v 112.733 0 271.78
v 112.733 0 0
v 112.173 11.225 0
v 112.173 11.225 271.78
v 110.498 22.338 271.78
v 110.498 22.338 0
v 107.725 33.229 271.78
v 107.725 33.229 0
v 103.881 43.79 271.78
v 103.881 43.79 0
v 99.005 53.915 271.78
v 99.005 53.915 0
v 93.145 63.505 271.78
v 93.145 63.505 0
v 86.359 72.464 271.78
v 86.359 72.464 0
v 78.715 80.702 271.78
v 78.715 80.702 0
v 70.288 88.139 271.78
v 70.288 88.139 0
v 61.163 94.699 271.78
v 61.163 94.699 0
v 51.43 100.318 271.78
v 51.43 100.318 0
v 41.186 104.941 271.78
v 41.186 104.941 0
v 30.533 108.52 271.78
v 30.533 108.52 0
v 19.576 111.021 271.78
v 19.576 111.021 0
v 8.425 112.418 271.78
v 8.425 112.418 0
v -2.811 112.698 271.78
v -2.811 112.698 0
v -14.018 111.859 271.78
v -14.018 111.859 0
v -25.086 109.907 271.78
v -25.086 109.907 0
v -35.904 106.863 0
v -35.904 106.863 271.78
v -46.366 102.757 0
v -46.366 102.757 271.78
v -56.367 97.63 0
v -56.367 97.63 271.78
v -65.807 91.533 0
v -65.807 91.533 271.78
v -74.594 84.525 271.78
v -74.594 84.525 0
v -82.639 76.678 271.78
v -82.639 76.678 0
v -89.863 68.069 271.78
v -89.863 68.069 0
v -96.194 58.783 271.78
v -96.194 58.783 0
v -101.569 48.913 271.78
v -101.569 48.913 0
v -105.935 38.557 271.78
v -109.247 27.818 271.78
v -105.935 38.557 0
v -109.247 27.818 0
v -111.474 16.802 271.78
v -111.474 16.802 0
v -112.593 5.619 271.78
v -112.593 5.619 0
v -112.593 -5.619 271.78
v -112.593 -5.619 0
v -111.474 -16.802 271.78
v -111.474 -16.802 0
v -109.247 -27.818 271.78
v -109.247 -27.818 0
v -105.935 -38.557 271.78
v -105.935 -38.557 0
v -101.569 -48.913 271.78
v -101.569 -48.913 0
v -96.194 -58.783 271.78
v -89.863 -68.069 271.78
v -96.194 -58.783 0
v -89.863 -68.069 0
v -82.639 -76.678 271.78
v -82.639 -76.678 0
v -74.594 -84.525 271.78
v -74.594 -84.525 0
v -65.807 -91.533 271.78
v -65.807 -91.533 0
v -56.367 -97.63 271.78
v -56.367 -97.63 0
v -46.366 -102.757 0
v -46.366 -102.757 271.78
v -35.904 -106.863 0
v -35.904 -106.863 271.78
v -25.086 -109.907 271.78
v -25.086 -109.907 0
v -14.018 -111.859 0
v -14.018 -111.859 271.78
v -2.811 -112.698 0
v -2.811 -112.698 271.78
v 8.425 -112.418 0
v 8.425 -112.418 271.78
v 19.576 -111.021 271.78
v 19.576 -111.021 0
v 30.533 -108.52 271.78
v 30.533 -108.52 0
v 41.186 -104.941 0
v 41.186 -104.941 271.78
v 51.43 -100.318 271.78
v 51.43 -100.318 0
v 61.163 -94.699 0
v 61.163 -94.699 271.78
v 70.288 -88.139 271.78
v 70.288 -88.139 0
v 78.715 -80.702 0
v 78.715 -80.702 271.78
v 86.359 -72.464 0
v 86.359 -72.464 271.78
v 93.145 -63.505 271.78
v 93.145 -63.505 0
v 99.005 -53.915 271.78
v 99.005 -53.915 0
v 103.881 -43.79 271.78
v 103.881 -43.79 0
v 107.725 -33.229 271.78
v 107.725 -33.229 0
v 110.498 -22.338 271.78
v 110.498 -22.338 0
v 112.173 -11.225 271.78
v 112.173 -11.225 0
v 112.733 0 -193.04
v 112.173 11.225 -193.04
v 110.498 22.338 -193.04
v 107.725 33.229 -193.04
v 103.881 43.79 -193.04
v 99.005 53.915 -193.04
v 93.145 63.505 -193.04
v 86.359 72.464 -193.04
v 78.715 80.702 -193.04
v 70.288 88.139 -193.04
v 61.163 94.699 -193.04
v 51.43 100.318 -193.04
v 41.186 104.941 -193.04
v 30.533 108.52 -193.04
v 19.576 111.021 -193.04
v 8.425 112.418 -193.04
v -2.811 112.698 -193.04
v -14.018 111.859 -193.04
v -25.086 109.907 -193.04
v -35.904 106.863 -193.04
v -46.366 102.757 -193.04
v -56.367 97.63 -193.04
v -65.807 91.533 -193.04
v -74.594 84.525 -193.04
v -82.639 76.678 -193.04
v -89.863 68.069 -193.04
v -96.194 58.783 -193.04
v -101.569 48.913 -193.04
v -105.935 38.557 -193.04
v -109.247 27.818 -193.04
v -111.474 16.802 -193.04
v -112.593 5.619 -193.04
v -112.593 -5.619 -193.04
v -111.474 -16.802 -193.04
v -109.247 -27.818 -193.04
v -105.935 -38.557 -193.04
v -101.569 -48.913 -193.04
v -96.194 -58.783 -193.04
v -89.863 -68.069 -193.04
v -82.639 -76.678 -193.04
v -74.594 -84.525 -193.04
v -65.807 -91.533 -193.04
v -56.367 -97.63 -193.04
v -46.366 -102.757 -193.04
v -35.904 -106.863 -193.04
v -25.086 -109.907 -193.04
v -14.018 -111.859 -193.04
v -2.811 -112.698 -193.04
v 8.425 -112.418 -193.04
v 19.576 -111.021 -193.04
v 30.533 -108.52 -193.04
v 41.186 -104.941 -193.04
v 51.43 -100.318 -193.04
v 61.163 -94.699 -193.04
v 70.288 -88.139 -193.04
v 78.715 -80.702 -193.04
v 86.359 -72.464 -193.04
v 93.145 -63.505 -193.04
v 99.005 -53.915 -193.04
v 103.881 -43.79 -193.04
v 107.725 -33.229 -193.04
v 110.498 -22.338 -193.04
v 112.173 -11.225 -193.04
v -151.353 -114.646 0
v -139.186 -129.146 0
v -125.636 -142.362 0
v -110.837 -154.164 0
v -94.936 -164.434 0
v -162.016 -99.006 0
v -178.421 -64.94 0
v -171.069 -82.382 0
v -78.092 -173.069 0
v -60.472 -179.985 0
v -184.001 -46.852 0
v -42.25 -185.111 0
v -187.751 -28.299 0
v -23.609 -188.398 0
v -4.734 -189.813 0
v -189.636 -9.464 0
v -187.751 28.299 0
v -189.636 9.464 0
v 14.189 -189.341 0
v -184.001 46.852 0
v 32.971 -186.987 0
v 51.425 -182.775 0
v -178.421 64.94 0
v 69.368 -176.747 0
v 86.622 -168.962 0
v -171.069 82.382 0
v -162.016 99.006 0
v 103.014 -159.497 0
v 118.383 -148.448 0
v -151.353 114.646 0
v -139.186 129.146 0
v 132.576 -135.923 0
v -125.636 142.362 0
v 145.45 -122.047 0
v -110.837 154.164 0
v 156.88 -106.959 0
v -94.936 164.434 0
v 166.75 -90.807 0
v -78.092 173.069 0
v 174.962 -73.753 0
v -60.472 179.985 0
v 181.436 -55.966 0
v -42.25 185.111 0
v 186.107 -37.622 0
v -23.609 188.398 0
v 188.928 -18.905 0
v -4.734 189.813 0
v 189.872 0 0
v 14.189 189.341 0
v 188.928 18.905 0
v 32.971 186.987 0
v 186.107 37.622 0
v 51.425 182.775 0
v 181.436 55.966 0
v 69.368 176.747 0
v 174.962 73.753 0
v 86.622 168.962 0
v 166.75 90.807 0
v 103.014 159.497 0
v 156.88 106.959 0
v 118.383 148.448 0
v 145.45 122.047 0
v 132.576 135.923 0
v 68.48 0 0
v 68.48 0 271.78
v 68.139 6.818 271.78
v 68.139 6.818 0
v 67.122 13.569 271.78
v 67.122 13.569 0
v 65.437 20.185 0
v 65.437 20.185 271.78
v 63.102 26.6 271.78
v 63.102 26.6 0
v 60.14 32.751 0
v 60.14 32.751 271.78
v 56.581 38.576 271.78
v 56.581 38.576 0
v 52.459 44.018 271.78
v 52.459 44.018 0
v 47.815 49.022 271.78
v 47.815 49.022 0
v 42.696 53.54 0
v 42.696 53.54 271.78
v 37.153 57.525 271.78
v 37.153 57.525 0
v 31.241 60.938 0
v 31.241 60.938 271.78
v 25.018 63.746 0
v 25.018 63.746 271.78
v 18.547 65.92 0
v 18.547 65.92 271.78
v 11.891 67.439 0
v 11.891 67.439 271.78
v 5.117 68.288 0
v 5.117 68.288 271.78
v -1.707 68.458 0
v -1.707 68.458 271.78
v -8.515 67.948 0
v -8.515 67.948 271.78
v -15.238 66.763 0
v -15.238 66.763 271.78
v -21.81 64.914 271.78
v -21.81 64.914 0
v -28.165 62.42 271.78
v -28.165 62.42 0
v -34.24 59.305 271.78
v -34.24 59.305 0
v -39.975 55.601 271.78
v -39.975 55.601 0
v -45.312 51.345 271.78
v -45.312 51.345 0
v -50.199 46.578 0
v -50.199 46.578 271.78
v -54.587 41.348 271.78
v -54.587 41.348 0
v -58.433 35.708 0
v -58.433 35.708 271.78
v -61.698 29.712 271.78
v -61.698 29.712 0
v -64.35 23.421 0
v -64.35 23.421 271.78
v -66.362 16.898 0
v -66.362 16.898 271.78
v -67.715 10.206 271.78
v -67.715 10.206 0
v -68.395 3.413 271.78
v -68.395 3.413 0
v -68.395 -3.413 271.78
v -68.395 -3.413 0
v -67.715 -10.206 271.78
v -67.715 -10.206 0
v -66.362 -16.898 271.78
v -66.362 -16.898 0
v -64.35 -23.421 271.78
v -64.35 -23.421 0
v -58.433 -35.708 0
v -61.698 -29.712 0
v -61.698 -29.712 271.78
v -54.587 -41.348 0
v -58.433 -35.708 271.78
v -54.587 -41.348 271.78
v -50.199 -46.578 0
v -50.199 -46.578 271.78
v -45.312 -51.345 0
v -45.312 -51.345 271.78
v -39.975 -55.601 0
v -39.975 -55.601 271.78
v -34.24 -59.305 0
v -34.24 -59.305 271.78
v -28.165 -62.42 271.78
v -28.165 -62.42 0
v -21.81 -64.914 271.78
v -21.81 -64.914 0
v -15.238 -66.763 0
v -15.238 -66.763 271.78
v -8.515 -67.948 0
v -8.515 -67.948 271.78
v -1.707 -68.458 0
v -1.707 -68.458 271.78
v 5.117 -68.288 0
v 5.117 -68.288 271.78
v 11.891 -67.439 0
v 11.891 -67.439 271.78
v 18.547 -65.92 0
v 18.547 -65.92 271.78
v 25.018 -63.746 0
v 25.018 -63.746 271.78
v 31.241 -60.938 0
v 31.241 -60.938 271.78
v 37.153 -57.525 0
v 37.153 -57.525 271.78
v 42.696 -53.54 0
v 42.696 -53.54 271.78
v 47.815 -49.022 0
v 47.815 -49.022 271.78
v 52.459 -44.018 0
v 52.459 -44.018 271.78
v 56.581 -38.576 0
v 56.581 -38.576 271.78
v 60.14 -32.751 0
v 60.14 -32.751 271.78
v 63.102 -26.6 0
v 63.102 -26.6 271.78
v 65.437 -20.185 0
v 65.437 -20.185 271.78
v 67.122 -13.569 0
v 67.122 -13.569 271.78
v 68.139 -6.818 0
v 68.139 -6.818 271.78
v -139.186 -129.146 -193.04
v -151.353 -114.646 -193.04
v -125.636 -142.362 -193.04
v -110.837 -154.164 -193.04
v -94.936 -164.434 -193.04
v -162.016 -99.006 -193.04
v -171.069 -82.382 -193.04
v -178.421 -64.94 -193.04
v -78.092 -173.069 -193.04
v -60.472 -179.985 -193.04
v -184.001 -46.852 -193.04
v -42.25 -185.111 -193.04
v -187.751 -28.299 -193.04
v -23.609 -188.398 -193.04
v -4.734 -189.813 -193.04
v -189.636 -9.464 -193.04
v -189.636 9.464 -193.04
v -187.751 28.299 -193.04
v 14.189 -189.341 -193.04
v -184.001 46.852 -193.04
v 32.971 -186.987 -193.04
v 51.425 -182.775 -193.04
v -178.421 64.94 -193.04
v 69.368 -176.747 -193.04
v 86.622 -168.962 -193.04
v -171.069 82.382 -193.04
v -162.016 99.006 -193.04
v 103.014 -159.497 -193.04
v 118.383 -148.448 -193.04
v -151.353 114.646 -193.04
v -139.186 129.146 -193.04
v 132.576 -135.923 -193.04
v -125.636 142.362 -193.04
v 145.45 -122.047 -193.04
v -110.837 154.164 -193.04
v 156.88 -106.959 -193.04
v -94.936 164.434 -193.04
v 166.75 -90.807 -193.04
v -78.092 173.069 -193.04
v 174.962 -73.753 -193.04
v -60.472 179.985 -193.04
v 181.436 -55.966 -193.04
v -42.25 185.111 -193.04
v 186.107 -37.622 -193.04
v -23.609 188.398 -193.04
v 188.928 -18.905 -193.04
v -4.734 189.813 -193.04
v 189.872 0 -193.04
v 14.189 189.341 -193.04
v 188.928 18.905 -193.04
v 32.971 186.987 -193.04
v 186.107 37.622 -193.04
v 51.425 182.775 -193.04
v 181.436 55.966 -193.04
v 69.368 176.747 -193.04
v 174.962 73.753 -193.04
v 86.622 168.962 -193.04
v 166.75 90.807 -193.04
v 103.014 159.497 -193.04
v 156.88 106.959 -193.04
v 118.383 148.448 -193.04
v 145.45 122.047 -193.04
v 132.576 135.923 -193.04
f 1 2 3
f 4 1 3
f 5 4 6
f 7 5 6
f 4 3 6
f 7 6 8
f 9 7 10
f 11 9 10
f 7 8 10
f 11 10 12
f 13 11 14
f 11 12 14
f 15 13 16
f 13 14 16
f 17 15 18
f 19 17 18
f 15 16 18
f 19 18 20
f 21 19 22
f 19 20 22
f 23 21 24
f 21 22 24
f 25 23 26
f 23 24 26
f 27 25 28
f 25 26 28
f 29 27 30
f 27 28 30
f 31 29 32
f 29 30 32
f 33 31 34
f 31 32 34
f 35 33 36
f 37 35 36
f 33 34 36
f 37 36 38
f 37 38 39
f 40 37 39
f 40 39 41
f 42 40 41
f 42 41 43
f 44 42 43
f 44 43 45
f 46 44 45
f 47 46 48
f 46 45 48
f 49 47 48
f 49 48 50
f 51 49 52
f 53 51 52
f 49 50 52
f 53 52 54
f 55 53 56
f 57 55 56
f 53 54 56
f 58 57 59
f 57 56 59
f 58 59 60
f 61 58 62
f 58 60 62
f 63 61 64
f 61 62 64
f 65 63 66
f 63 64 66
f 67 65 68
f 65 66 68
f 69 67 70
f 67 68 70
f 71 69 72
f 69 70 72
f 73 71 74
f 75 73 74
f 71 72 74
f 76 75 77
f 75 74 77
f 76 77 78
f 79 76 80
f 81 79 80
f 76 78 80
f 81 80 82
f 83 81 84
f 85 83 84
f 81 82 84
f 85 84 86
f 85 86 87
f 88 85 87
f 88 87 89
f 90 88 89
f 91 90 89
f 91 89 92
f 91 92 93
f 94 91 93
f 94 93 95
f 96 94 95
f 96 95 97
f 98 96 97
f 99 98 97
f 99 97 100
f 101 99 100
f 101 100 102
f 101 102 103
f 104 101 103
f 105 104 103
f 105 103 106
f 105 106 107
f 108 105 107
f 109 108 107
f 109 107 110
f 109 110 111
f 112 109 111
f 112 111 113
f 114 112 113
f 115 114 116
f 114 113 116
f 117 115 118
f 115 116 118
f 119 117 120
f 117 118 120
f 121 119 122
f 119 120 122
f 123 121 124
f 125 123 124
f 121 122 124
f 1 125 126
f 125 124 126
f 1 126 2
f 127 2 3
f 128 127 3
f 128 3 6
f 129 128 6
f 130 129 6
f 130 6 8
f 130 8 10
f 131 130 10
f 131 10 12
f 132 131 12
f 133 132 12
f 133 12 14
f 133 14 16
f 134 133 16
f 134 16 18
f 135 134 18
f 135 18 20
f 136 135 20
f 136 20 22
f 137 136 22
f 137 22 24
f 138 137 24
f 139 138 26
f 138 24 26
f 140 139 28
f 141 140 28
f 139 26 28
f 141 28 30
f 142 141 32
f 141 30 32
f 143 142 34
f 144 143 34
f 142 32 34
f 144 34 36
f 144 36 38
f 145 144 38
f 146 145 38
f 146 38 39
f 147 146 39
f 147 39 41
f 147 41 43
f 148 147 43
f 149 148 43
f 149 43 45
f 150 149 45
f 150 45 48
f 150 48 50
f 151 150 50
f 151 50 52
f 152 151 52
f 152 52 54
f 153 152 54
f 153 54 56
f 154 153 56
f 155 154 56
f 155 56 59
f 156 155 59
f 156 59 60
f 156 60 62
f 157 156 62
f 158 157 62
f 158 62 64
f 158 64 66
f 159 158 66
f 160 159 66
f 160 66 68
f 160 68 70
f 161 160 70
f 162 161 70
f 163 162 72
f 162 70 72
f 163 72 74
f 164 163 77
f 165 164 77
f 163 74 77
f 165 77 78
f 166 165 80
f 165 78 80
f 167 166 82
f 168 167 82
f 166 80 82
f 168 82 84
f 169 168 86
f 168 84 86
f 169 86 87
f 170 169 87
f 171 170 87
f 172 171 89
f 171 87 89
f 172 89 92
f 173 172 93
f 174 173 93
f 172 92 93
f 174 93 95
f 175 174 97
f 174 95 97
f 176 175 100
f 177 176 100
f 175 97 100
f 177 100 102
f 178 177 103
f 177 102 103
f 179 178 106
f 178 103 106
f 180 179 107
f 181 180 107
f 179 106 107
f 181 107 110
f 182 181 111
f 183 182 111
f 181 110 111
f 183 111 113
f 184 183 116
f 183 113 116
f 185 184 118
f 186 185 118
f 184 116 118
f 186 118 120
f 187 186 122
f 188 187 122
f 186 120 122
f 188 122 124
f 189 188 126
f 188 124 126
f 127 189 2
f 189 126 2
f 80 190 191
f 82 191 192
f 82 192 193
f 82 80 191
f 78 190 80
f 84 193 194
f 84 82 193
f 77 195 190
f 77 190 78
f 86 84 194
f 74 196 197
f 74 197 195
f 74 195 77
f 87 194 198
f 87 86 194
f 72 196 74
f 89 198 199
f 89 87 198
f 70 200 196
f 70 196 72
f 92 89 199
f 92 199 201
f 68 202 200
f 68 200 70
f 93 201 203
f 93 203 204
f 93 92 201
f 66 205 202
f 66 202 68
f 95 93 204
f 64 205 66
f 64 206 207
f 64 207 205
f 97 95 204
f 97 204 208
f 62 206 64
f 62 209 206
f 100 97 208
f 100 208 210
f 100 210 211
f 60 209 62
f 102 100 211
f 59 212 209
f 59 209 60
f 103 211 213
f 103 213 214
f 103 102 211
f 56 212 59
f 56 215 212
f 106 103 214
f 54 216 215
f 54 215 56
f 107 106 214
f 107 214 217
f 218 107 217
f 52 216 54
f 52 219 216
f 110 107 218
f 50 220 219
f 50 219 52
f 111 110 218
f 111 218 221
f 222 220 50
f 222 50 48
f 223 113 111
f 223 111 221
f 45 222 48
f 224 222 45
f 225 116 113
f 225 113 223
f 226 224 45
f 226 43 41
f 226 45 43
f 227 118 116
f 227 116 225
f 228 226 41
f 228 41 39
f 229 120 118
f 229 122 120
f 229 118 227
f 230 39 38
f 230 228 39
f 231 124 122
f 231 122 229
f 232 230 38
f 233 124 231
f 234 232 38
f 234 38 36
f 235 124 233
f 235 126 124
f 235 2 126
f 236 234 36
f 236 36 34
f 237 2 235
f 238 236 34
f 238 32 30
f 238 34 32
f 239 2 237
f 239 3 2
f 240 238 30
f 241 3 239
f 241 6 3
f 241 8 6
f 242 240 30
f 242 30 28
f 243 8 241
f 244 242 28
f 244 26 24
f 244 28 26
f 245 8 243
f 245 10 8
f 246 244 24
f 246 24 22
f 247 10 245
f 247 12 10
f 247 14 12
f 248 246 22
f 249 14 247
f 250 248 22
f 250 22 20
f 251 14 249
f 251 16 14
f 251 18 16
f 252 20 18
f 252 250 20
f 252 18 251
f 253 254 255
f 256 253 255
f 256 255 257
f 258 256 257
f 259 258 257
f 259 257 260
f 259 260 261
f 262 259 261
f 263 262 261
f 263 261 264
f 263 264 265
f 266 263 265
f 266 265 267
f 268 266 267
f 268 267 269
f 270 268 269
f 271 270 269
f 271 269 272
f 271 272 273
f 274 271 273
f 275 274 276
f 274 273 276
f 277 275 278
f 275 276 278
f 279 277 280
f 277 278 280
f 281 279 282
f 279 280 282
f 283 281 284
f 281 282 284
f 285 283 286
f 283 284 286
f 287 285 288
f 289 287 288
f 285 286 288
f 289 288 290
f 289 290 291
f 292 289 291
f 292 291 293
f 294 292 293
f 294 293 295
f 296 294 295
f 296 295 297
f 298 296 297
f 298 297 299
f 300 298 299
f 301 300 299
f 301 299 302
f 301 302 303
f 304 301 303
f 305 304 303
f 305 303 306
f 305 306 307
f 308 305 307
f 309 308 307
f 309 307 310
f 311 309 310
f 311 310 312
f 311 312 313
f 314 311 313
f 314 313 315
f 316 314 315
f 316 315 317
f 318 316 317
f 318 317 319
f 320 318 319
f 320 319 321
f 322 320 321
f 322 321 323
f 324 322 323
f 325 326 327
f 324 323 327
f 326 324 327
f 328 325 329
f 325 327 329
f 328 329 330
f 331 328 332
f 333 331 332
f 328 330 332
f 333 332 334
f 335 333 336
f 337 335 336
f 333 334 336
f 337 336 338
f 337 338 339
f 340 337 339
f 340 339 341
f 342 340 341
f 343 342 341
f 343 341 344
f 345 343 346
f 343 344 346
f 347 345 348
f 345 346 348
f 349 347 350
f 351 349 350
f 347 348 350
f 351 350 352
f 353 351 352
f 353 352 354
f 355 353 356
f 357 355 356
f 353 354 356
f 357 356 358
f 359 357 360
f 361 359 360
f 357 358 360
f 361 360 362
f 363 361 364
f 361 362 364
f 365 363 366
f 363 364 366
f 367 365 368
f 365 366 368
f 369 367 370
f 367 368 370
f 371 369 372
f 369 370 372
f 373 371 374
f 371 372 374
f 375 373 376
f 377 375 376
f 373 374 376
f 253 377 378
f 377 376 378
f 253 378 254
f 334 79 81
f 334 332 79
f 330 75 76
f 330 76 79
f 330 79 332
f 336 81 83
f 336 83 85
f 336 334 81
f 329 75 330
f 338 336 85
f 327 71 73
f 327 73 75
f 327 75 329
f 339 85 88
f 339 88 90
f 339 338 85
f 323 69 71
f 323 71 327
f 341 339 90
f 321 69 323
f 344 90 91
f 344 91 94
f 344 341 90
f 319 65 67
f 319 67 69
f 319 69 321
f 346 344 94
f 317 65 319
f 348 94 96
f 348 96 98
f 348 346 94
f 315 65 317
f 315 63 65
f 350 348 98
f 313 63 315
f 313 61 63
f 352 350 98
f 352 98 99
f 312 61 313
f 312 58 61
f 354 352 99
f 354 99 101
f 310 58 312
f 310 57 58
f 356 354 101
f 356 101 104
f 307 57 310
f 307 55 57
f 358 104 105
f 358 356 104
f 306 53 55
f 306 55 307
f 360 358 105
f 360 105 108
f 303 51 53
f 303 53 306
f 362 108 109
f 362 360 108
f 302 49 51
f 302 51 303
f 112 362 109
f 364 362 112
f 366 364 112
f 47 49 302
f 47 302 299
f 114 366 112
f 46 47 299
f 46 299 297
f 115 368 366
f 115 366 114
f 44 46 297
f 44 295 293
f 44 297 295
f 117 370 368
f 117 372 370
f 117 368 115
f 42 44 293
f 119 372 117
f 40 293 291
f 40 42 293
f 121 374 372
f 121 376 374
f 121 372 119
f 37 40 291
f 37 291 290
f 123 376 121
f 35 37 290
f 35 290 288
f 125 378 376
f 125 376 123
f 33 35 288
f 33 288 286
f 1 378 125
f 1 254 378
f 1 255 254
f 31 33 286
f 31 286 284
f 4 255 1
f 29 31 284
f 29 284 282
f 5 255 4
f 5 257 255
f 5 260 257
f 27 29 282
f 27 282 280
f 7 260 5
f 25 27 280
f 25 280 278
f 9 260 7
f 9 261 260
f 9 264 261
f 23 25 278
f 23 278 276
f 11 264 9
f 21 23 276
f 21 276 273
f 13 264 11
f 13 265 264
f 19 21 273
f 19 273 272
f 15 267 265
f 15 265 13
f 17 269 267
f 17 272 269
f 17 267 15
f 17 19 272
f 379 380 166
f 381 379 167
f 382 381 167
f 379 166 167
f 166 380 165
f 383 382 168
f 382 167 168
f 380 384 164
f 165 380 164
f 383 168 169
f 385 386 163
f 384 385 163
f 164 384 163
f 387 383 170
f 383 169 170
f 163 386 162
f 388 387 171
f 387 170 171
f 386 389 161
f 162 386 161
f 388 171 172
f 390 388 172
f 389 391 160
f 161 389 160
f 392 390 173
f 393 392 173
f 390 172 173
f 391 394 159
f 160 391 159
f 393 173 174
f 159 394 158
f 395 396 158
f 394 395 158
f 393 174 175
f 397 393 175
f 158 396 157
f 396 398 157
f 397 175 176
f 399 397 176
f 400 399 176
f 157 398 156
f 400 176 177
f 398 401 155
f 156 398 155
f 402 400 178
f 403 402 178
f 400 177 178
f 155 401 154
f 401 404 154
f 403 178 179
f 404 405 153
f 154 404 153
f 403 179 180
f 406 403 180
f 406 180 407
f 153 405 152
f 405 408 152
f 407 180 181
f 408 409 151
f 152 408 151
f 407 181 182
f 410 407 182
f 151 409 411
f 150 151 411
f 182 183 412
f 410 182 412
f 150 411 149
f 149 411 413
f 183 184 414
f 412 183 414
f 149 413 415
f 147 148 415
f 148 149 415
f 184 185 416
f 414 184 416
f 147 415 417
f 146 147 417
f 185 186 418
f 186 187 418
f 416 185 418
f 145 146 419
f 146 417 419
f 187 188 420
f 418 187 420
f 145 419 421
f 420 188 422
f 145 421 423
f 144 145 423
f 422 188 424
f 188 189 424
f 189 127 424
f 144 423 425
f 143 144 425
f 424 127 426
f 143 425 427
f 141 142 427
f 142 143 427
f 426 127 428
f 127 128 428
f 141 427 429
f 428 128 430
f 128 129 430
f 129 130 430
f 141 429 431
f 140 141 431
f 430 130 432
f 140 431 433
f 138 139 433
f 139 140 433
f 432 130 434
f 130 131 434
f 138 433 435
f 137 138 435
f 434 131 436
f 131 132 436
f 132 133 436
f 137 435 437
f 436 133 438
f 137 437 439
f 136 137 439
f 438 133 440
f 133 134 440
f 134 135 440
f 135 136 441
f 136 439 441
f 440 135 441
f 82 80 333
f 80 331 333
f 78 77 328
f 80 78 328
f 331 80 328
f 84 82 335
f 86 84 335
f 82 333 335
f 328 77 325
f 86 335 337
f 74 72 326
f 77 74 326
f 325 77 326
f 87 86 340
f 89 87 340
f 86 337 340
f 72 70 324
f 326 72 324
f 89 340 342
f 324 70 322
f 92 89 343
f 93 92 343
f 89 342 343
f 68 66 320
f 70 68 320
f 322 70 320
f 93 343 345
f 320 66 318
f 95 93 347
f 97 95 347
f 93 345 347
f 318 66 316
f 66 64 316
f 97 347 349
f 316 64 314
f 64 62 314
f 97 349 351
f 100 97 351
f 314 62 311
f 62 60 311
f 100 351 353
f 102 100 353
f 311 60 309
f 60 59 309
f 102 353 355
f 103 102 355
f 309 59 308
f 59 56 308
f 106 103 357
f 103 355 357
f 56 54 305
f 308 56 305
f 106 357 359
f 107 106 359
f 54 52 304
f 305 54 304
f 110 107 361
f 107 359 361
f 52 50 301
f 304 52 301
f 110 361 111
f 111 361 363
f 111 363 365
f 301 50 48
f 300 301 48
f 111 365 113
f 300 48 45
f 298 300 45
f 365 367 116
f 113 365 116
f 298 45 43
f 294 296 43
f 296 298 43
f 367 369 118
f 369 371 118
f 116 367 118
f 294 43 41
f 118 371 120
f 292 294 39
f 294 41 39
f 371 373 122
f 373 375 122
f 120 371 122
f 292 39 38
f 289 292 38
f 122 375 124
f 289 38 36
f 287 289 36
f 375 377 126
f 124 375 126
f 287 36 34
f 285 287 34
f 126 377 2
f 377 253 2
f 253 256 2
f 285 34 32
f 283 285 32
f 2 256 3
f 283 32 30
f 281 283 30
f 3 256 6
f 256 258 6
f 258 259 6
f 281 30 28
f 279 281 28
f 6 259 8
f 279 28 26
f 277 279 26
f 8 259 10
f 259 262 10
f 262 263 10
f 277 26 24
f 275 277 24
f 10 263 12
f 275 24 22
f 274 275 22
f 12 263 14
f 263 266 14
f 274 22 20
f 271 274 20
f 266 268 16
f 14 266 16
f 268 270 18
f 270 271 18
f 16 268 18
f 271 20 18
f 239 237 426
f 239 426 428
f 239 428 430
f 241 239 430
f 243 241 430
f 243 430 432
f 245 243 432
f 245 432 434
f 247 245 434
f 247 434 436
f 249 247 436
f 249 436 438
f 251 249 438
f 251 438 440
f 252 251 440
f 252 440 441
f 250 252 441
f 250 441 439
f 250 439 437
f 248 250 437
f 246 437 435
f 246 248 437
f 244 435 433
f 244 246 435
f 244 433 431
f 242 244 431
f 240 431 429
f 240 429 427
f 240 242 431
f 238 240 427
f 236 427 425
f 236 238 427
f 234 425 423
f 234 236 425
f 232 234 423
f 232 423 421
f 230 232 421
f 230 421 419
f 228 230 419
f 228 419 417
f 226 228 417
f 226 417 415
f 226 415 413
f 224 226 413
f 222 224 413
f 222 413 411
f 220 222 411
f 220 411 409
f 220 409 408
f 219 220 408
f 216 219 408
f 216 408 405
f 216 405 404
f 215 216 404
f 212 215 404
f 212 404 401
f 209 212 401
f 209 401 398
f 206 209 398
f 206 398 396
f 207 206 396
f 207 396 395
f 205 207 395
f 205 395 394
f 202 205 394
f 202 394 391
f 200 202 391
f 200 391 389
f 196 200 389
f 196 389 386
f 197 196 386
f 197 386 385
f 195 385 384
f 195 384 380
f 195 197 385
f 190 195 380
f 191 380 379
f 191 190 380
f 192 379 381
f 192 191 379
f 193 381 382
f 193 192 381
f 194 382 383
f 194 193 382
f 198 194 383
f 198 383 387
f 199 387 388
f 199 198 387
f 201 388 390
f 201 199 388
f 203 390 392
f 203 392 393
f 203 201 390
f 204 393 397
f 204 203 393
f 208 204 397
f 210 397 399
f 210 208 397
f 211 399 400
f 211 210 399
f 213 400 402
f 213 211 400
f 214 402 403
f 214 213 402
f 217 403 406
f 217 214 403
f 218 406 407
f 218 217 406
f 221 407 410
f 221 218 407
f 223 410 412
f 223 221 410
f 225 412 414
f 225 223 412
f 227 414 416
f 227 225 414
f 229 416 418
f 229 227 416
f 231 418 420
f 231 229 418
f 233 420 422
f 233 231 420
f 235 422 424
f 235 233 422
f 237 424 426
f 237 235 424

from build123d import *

# Parameters (mm, degrees)
F0_R     = 189.8719183156
F1_DEPTH = 218.44
F2_R     = 112.7334513361
F3_DEPTH = 271.78
F4_R     = 68.4797366721
F5_DEPTH = 322.58
F6_DEPTH = 360.68
F7_DEPTH = 1069.34
F8_DEPTH = 25.4


with BuildPart() as f1:
    # F0 (on Top) → F1 (new body)
    with BuildSketch(Plane.XY):
        Circle(F0_R)
    extrude(amount=-F1_DEPTH)

    # F2 (on face) → F3 (join)
    with BuildSketch(Plane.XY):
        Circle(F2_R)
    extrude(amount=F3_DEPTH)

    # F4 (on face) → F5 (join)
    with BuildSketch(Plane.XY.offset(271.78)):
        Circle(F4_R)
    extrude(amount=F5_DEPTH)

    # F4 (on face) + F2 (on face) → F6 (cut)
    with BuildSketch(Plane.XY.offset(271.78)):
        Circle(F4_R)
    with BuildSketch(Plane.XY):
        Circle(F2_R)
    extrude(amount=-F6_DEPTH, mode=Mode.SUBTRACT)

    # F7 (cut): a face of the model
    f7_faces = [f1.faces().sort_by_distance(p)[0] for p in [
        (0, 0, 594.36),
    ]]
    extrude(f7_faces, amount=-F7_DEPTH, mode=Mode.SUBTRACT)

    # F8 (cut): a face of the model
    f8_faces = [f1.faces().sort_by_distance(p)[0] for p in [
        (-184.5015294757, 0, -218.44),
    ]]
    extrude(f8_faces, amount=-F8_DEPTH, mode=Mode.SUBTRACT)


solid = f1.part
